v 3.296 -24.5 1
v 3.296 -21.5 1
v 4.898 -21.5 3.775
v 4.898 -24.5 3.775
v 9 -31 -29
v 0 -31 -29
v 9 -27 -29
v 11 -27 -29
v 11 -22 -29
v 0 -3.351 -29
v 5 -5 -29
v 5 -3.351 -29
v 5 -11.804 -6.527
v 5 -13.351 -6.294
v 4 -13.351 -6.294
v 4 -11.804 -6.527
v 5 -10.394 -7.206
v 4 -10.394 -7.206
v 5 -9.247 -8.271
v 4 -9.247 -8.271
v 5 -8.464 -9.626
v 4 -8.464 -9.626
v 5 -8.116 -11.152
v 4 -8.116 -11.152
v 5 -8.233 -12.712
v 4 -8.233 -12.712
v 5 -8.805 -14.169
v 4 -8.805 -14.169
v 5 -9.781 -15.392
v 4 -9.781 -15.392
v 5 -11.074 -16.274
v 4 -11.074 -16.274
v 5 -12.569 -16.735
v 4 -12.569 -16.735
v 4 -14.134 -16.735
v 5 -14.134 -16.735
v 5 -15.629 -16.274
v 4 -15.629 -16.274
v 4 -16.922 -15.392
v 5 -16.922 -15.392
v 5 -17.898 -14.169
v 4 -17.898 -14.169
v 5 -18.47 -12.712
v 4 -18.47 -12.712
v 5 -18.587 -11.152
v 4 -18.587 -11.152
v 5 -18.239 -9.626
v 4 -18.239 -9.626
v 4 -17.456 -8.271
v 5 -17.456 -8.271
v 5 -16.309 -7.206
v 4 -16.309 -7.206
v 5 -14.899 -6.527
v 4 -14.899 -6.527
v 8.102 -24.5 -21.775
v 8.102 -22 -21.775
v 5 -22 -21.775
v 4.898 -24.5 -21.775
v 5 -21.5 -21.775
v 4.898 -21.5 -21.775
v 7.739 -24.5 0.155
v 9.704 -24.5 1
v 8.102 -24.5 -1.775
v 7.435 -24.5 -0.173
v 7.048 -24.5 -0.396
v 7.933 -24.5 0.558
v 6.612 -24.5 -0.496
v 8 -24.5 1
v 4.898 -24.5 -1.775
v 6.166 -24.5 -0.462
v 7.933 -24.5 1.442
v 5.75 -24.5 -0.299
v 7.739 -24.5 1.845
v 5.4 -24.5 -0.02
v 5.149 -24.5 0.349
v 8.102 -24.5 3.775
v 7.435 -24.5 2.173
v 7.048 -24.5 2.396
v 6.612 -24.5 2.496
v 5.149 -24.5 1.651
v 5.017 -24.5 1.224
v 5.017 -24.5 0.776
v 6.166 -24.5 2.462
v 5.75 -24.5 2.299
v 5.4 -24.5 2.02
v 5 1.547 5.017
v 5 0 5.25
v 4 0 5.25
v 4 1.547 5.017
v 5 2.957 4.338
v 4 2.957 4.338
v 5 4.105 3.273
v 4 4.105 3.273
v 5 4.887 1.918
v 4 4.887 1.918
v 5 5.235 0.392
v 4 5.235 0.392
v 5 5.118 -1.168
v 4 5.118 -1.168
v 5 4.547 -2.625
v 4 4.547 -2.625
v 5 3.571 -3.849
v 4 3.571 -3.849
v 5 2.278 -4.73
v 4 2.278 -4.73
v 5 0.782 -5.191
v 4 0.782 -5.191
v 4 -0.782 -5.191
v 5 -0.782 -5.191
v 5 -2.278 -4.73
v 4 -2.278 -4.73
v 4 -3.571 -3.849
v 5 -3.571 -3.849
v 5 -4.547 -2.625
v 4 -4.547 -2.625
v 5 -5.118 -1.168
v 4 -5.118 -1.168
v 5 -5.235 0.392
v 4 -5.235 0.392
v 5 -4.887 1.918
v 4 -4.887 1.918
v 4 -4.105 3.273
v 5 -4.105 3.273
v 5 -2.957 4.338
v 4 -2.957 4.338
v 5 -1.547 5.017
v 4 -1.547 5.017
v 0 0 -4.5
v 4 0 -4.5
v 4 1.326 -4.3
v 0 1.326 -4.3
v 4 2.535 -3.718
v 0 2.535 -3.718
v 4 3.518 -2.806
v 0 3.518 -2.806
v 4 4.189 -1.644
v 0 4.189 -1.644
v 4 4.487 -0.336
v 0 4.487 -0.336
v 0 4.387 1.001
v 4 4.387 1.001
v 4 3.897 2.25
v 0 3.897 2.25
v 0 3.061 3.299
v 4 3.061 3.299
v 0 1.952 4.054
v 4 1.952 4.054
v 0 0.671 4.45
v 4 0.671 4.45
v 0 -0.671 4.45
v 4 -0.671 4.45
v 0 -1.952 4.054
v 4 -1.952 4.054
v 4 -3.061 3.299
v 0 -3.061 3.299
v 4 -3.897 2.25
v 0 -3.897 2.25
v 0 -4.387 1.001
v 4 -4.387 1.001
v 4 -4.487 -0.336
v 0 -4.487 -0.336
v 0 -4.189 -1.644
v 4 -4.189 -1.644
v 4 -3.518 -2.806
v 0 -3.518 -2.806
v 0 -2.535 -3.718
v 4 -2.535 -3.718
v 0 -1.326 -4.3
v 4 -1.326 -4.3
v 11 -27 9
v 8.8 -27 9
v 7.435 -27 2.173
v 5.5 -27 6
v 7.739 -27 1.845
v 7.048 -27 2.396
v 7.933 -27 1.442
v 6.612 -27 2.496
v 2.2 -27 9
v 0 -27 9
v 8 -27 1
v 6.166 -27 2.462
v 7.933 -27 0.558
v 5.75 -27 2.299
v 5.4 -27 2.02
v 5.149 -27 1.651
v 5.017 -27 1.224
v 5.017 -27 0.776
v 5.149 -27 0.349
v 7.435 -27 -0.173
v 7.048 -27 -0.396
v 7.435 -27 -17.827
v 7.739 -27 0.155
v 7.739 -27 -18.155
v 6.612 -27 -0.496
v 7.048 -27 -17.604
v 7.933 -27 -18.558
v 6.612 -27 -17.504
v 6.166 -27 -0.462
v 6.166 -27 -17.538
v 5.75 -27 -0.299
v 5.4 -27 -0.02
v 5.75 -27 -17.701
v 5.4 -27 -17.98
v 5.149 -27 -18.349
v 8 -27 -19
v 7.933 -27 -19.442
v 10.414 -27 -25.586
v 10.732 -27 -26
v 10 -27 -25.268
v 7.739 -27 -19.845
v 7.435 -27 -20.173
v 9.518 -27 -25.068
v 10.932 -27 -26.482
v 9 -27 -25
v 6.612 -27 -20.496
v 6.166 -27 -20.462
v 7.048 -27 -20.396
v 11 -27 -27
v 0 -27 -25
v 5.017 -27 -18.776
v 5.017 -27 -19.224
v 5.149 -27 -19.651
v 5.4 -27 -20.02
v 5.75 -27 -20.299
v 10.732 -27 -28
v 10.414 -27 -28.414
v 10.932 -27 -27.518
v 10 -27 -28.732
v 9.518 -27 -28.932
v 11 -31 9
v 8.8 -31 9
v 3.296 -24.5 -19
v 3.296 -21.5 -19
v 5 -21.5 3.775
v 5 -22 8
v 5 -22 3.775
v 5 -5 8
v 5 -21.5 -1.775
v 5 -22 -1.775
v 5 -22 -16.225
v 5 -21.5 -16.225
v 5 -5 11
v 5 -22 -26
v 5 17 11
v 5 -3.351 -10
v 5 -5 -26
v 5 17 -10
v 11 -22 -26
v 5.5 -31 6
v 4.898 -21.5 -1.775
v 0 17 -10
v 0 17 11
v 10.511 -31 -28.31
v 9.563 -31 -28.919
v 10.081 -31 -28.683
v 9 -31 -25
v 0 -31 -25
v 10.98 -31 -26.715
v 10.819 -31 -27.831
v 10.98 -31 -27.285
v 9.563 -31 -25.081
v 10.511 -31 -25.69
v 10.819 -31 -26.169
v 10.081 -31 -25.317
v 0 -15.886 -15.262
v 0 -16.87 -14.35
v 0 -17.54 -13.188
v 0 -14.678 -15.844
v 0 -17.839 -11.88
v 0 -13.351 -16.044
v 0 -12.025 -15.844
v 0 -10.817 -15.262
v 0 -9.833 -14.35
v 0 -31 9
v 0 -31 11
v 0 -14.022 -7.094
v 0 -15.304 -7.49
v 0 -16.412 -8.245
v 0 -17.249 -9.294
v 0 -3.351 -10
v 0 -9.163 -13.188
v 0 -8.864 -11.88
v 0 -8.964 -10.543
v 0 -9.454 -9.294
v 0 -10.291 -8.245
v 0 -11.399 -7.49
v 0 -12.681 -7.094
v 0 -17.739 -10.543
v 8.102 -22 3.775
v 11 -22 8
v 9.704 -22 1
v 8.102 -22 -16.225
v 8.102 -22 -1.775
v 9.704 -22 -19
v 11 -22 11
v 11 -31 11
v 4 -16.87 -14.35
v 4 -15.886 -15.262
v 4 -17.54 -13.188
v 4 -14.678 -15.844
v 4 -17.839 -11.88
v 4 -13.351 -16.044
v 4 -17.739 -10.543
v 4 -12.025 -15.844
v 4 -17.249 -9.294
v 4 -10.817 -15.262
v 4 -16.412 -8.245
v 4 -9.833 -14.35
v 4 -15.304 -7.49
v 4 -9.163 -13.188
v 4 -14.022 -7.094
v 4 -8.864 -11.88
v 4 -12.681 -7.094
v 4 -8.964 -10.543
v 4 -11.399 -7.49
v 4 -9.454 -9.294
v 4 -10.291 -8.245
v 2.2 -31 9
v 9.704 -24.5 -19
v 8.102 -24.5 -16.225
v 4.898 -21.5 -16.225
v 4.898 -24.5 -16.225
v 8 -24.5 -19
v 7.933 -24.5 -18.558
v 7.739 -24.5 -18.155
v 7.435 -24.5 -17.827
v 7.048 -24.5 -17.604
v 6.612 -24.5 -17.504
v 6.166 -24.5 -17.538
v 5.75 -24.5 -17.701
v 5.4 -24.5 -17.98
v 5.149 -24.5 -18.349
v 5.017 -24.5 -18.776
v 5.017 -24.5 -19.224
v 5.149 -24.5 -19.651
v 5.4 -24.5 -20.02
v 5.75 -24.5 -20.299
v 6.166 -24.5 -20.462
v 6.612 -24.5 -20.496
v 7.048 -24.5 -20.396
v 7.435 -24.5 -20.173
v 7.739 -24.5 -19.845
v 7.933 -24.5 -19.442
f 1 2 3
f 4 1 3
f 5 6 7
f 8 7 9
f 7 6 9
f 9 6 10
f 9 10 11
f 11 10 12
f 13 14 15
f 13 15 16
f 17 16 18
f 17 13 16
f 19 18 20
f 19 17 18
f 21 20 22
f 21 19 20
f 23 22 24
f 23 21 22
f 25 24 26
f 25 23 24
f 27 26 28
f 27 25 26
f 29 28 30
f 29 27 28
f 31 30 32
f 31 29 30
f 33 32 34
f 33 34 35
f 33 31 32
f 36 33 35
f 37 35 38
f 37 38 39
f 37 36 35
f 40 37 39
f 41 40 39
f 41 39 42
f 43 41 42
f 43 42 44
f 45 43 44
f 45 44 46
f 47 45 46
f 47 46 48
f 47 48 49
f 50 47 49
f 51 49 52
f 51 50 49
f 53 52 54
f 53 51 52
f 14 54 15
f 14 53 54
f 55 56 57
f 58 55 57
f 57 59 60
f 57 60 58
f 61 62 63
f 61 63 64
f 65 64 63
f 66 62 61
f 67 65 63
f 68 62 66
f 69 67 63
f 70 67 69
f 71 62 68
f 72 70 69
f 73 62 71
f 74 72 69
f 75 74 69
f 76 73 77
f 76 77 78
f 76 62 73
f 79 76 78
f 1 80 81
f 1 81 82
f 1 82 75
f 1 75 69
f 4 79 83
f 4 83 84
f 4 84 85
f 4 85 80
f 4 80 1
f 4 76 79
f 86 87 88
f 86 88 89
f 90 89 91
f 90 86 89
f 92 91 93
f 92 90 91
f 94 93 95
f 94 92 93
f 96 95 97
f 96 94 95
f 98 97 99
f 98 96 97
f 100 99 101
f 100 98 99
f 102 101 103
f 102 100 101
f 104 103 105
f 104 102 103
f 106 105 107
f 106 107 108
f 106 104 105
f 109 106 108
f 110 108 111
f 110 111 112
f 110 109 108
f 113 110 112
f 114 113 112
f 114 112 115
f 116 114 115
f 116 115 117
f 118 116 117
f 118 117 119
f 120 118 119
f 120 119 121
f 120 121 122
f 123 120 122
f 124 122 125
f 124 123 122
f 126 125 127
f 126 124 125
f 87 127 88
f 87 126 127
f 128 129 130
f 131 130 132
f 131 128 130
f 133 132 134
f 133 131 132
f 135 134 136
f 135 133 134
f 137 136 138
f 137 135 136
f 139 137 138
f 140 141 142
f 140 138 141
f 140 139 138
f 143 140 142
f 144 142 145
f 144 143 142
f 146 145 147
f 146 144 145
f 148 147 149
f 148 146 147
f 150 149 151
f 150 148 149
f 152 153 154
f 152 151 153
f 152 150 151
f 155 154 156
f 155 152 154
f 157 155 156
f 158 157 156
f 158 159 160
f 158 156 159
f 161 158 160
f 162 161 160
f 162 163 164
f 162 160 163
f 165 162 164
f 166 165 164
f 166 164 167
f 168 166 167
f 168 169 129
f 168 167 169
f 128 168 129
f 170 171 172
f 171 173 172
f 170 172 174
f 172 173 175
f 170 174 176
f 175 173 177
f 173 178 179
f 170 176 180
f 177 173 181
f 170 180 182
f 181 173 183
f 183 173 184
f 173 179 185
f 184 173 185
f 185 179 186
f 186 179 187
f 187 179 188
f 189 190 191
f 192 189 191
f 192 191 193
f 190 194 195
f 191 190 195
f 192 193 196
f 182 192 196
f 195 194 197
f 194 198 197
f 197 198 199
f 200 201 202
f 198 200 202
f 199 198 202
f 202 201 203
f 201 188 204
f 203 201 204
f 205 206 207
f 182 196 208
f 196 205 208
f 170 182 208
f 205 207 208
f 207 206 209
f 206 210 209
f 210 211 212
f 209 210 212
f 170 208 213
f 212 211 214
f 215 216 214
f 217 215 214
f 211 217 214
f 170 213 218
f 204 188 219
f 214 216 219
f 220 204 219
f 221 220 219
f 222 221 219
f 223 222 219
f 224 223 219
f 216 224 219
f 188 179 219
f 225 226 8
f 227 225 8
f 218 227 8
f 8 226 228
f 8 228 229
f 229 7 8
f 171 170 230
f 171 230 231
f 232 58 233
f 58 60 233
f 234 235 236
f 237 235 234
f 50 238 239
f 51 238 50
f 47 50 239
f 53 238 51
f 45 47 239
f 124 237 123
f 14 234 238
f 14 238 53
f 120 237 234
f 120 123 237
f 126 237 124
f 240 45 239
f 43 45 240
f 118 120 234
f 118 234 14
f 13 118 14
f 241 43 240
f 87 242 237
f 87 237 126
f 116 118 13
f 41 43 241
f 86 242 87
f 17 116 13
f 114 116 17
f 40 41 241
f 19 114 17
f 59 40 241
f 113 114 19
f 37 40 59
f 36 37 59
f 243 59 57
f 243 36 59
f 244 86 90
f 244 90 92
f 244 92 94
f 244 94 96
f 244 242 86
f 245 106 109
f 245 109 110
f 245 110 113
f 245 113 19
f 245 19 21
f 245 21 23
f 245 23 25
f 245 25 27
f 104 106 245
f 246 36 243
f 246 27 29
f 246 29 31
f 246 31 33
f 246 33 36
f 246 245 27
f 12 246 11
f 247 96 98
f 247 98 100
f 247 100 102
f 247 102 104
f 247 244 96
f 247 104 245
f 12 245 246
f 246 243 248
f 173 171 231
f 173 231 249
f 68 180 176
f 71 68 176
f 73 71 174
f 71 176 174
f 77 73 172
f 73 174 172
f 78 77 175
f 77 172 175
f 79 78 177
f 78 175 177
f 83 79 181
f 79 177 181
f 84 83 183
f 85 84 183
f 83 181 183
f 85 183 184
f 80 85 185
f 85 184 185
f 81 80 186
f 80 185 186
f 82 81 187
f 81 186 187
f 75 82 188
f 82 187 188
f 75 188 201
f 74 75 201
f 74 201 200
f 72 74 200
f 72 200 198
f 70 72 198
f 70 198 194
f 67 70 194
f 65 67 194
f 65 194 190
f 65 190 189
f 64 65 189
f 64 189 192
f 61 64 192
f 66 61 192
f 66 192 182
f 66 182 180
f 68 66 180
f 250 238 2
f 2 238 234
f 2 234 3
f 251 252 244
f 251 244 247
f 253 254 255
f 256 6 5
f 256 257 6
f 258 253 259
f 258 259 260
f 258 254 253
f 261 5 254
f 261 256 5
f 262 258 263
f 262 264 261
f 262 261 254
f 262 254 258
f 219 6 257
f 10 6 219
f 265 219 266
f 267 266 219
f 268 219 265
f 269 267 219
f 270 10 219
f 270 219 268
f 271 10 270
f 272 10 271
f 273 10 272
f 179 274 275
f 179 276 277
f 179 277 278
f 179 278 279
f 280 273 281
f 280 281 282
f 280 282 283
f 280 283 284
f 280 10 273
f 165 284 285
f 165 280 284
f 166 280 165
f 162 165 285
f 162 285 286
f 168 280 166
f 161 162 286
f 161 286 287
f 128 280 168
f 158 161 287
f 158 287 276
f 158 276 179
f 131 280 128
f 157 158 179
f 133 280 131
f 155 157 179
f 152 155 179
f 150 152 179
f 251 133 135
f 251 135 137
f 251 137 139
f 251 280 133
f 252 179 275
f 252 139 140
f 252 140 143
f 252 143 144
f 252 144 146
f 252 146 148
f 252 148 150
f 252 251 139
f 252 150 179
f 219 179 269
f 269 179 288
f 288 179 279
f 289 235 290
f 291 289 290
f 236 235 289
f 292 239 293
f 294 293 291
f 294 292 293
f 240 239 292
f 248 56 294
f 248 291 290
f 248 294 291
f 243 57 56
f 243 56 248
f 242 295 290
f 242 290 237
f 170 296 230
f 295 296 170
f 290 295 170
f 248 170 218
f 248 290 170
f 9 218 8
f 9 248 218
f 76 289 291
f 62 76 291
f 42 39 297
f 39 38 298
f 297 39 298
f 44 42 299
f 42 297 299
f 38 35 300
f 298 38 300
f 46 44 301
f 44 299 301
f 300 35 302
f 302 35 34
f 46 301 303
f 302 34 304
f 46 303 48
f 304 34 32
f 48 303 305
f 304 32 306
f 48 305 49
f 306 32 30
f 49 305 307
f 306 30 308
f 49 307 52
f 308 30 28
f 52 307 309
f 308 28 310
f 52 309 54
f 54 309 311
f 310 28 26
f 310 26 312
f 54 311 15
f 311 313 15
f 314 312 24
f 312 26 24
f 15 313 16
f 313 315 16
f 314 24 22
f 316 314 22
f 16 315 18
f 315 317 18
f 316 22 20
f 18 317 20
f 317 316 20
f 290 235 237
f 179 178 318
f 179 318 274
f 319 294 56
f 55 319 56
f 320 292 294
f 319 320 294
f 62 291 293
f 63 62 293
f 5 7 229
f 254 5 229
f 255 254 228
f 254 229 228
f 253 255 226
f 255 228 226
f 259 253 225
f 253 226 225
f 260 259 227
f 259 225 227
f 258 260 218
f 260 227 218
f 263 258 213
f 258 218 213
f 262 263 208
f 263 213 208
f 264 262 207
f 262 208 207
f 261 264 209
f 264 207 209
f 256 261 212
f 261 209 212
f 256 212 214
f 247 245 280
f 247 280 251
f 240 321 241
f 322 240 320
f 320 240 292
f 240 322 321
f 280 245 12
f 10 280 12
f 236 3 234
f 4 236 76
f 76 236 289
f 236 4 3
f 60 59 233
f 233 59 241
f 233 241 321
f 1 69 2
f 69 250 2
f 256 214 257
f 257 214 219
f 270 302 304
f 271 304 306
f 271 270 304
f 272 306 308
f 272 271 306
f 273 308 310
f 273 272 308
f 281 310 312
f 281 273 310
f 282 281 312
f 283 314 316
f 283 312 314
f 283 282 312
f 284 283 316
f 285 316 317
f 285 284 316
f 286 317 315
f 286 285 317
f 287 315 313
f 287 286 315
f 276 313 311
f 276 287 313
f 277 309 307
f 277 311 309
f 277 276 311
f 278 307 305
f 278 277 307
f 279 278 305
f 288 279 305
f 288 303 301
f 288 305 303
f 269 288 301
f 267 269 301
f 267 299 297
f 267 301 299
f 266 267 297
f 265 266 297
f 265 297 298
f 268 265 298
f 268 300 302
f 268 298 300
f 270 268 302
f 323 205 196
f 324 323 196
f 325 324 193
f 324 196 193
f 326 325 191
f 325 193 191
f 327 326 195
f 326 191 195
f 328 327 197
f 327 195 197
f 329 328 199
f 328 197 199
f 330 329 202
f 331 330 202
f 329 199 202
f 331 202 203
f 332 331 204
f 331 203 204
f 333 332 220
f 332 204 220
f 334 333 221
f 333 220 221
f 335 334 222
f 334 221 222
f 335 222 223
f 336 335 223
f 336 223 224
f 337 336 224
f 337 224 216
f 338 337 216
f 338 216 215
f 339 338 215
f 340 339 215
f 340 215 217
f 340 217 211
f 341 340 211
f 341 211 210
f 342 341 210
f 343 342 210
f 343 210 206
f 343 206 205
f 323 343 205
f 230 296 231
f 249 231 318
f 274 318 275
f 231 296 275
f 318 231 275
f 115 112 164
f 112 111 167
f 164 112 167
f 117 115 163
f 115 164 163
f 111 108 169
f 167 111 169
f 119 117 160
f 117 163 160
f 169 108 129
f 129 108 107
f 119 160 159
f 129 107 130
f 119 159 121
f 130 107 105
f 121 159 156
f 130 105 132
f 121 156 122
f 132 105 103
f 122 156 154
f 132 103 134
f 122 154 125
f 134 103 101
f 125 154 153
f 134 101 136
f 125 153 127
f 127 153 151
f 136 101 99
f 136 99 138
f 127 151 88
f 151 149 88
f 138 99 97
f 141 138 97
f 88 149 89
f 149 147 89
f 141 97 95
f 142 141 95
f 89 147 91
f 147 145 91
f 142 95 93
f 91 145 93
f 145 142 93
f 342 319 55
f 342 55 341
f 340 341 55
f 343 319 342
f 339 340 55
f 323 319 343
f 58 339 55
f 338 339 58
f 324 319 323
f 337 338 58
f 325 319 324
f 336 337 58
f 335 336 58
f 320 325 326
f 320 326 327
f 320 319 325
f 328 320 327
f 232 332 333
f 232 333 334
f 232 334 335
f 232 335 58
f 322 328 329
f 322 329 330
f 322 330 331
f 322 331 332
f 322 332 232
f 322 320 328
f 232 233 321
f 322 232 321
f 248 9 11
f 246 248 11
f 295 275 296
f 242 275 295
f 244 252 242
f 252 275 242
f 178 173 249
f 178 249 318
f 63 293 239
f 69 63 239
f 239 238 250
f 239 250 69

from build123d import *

# Parameters (mm, degrees)
SKETCH_1_W               = 40
SKETCH_1_H               = 44
SKETCH_1_R               = 4.5
EXTRUDE_1_DEPTH          = 5
SKETCH_2_R               = 5.25
CUT_EXTRUDE_1_DEPTH      = 1
CUT_EXTRUDE_2_REACH      = 7
SKETCH_3_W               = 19
SKETCH_3_H               = 20.351449313
SKETCH_4_W               = 40
SKETCH_4_H               = 5
EXTRUDE_2_DEPTH          = 6
EXTRUDE_3_DEPTH          = 4
SKETCH_6_R               = 1.5
CUT_EXTRUDE_4_DEPTH      = 5
CUT_EXTRUDE_5_DEPTH      = 0.5
CUT_EXTRUDE_5_DEPTH_BACK = 2.5
EXTRUDE_4_DEPTH          = 3
EXTRUDE_5_DEPTH          = 3


with BuildPart() as part:
    # 草图1 → 凸台-拉伸1 (new body)
    with BuildSketch(Plane(origin=(0, 0, 0), x_dir=(0, 0, -1), z_dir=(1, 0, 0))):
        with Locations((9, -5)):
            Rectangle(SKETCH_1_W, SKETCH_1_H)
        Circle(SKETCH_1_R, mode=Mode.SUBTRACT)
        with Locations((18, 6)):
            Circle(SKETCH_1_R, mode=Mode.SUBTRACT)
        with Locations((11.543885882, -13.351449313)):
            Circle(SKETCH_1_R, mode=Mode.SUBTRACT)
    extrude(amount=EXTRUDE_1_DEPTH)

    # 草图2 → 切除-拉伸1 (cut)
    with BuildSketch(Plane.ZY.offset(-5)):
        with Locations((-18, 6)):
            Circle(SKETCH_2_R)
        Circle(SKETCH_2_R)
        with Locations((-11.543885882, -13.351449313)):
            Circle(SKETCH_2_R)
    extrude(amount=CUT_EXTRUDE_1_DEPTH, mode=Mode.SUBTRACT)

    # 草图3 → 切除-拉伸2 (cut, up to next)
    with BuildSketch(Plane(origin=(5, 0, 0), x_dir=(0, 0, -1), z_dir=(1, 0, 0)), mode=Mode.PRIVATE) as cut_extrude_2_sk1:
        with Locations((19.5, 6.824275344)):
            Rectangle(SKETCH_3_W, SKETCH_3_H)
    cut_extrude_2_tool1 = extrude(cut_extrude_2_sk1.sketch, amount=-CUT_EXTRUDE_2_REACH, mode=Mode.PRIVATE) & part.part
    add(cut_extrude_2_tool1.solids().sort_by_distance((5, 6.824275, -19.5))[0], mode=Mode.SUBTRACT)

    # 草图4 → 凸台-拉伸2 (add)
    with BuildSketch(Plane(origin=(5, 0, 0), x_dir=(0, 0, -1), z_dir=(1, 0, 0))):
        with Locations((9, -24.5)):
            Rectangle(SKETCH_4_W, SKETCH_4_H)
    extrude(amount=EXTRUDE_2_DEPTH)

    # 草图5 → 凸台-拉伸3 (add)
    with BuildSketch(Plane.XZ.offset(27)):
        Polygon((0, 11), (11, 11), (11, 9), (8.8, 9), (5.5, 6), (2.2, 9), (0, 9), align=None)
        with BuildLine():
            Line((0, -29), (9, -29))
            ThreePointArc((9, -29), (11, -27), (9, -25))
            Line((9, -25), (0, -25))
            Line((0, -25), (0, -29))
        make_face()
    extrude(amount=EXTRUDE_3_DEPTH)

    # 草图6 → 切除-拉伸4 (cut)
    with BuildSketch(Plane.XZ.offset(27)):
        with Locations((6.5, -19)):
            Circle(SKETCH_6_R)
        with Locations((6.5, 1)):
            Circle(SKETCH_6_R)
    extrude(amount=-CUT_EXTRUDE_4_DEPTH, mode=Mode.SUBTRACT)

    # 草图7 → 切除-拉伸5 (cut, two sides)
    with BuildSketch(Plane(origin=(0, -22, 0), x_dir=(-1, 0, 0), z_dir=(0, 1, 0))) as cut_extrude_5_sk:
        Polygon((-9.704293994, -19), (-8.102146997, -21.775), (-4.897853003, -21.775), (-3.295706006, -19), (-4.897853003, -16.225), (-8.102146997, -16.225), align=None)
        Polygon((-9.704293994, 1), (-8.102146997, -1.775), (-4.897853003, -1.775), (-3.295706006, 1), (-4.897853003, 3.775), (-8.102146997, 3.775), align=None)
    extrude(amount=CUT_EXTRUDE_5_DEPTH, mode=Mode.SUBTRACT)
    extrude(cut_extrude_5_sk.sketch, amount=-CUT_EXTRUDE_5_DEPTH_BACK, mode=Mode.SUBTRACT)

    # 草图8 → 凸台-拉伸4 (add)
    with BuildSketch(Plane.XY.offset(11)):
        Polygon((5, -22), (11, -22), (5, -5), align=None)
    extrude(amount=-EXTRUDE_4_DEPTH)

    # 草图9 → 凸台-拉伸5 (add)
    with BuildSketch(Plane(origin=(0, 0, -29), x_dir=(-1, 0, 0), z_dir=(0, 0, -1))):
        Polygon((-5, -22), (-11, -22), (-5, -5), align=None)
    extrude(amount=-EXTRUDE_5_DEPTH)


solid = part.part
